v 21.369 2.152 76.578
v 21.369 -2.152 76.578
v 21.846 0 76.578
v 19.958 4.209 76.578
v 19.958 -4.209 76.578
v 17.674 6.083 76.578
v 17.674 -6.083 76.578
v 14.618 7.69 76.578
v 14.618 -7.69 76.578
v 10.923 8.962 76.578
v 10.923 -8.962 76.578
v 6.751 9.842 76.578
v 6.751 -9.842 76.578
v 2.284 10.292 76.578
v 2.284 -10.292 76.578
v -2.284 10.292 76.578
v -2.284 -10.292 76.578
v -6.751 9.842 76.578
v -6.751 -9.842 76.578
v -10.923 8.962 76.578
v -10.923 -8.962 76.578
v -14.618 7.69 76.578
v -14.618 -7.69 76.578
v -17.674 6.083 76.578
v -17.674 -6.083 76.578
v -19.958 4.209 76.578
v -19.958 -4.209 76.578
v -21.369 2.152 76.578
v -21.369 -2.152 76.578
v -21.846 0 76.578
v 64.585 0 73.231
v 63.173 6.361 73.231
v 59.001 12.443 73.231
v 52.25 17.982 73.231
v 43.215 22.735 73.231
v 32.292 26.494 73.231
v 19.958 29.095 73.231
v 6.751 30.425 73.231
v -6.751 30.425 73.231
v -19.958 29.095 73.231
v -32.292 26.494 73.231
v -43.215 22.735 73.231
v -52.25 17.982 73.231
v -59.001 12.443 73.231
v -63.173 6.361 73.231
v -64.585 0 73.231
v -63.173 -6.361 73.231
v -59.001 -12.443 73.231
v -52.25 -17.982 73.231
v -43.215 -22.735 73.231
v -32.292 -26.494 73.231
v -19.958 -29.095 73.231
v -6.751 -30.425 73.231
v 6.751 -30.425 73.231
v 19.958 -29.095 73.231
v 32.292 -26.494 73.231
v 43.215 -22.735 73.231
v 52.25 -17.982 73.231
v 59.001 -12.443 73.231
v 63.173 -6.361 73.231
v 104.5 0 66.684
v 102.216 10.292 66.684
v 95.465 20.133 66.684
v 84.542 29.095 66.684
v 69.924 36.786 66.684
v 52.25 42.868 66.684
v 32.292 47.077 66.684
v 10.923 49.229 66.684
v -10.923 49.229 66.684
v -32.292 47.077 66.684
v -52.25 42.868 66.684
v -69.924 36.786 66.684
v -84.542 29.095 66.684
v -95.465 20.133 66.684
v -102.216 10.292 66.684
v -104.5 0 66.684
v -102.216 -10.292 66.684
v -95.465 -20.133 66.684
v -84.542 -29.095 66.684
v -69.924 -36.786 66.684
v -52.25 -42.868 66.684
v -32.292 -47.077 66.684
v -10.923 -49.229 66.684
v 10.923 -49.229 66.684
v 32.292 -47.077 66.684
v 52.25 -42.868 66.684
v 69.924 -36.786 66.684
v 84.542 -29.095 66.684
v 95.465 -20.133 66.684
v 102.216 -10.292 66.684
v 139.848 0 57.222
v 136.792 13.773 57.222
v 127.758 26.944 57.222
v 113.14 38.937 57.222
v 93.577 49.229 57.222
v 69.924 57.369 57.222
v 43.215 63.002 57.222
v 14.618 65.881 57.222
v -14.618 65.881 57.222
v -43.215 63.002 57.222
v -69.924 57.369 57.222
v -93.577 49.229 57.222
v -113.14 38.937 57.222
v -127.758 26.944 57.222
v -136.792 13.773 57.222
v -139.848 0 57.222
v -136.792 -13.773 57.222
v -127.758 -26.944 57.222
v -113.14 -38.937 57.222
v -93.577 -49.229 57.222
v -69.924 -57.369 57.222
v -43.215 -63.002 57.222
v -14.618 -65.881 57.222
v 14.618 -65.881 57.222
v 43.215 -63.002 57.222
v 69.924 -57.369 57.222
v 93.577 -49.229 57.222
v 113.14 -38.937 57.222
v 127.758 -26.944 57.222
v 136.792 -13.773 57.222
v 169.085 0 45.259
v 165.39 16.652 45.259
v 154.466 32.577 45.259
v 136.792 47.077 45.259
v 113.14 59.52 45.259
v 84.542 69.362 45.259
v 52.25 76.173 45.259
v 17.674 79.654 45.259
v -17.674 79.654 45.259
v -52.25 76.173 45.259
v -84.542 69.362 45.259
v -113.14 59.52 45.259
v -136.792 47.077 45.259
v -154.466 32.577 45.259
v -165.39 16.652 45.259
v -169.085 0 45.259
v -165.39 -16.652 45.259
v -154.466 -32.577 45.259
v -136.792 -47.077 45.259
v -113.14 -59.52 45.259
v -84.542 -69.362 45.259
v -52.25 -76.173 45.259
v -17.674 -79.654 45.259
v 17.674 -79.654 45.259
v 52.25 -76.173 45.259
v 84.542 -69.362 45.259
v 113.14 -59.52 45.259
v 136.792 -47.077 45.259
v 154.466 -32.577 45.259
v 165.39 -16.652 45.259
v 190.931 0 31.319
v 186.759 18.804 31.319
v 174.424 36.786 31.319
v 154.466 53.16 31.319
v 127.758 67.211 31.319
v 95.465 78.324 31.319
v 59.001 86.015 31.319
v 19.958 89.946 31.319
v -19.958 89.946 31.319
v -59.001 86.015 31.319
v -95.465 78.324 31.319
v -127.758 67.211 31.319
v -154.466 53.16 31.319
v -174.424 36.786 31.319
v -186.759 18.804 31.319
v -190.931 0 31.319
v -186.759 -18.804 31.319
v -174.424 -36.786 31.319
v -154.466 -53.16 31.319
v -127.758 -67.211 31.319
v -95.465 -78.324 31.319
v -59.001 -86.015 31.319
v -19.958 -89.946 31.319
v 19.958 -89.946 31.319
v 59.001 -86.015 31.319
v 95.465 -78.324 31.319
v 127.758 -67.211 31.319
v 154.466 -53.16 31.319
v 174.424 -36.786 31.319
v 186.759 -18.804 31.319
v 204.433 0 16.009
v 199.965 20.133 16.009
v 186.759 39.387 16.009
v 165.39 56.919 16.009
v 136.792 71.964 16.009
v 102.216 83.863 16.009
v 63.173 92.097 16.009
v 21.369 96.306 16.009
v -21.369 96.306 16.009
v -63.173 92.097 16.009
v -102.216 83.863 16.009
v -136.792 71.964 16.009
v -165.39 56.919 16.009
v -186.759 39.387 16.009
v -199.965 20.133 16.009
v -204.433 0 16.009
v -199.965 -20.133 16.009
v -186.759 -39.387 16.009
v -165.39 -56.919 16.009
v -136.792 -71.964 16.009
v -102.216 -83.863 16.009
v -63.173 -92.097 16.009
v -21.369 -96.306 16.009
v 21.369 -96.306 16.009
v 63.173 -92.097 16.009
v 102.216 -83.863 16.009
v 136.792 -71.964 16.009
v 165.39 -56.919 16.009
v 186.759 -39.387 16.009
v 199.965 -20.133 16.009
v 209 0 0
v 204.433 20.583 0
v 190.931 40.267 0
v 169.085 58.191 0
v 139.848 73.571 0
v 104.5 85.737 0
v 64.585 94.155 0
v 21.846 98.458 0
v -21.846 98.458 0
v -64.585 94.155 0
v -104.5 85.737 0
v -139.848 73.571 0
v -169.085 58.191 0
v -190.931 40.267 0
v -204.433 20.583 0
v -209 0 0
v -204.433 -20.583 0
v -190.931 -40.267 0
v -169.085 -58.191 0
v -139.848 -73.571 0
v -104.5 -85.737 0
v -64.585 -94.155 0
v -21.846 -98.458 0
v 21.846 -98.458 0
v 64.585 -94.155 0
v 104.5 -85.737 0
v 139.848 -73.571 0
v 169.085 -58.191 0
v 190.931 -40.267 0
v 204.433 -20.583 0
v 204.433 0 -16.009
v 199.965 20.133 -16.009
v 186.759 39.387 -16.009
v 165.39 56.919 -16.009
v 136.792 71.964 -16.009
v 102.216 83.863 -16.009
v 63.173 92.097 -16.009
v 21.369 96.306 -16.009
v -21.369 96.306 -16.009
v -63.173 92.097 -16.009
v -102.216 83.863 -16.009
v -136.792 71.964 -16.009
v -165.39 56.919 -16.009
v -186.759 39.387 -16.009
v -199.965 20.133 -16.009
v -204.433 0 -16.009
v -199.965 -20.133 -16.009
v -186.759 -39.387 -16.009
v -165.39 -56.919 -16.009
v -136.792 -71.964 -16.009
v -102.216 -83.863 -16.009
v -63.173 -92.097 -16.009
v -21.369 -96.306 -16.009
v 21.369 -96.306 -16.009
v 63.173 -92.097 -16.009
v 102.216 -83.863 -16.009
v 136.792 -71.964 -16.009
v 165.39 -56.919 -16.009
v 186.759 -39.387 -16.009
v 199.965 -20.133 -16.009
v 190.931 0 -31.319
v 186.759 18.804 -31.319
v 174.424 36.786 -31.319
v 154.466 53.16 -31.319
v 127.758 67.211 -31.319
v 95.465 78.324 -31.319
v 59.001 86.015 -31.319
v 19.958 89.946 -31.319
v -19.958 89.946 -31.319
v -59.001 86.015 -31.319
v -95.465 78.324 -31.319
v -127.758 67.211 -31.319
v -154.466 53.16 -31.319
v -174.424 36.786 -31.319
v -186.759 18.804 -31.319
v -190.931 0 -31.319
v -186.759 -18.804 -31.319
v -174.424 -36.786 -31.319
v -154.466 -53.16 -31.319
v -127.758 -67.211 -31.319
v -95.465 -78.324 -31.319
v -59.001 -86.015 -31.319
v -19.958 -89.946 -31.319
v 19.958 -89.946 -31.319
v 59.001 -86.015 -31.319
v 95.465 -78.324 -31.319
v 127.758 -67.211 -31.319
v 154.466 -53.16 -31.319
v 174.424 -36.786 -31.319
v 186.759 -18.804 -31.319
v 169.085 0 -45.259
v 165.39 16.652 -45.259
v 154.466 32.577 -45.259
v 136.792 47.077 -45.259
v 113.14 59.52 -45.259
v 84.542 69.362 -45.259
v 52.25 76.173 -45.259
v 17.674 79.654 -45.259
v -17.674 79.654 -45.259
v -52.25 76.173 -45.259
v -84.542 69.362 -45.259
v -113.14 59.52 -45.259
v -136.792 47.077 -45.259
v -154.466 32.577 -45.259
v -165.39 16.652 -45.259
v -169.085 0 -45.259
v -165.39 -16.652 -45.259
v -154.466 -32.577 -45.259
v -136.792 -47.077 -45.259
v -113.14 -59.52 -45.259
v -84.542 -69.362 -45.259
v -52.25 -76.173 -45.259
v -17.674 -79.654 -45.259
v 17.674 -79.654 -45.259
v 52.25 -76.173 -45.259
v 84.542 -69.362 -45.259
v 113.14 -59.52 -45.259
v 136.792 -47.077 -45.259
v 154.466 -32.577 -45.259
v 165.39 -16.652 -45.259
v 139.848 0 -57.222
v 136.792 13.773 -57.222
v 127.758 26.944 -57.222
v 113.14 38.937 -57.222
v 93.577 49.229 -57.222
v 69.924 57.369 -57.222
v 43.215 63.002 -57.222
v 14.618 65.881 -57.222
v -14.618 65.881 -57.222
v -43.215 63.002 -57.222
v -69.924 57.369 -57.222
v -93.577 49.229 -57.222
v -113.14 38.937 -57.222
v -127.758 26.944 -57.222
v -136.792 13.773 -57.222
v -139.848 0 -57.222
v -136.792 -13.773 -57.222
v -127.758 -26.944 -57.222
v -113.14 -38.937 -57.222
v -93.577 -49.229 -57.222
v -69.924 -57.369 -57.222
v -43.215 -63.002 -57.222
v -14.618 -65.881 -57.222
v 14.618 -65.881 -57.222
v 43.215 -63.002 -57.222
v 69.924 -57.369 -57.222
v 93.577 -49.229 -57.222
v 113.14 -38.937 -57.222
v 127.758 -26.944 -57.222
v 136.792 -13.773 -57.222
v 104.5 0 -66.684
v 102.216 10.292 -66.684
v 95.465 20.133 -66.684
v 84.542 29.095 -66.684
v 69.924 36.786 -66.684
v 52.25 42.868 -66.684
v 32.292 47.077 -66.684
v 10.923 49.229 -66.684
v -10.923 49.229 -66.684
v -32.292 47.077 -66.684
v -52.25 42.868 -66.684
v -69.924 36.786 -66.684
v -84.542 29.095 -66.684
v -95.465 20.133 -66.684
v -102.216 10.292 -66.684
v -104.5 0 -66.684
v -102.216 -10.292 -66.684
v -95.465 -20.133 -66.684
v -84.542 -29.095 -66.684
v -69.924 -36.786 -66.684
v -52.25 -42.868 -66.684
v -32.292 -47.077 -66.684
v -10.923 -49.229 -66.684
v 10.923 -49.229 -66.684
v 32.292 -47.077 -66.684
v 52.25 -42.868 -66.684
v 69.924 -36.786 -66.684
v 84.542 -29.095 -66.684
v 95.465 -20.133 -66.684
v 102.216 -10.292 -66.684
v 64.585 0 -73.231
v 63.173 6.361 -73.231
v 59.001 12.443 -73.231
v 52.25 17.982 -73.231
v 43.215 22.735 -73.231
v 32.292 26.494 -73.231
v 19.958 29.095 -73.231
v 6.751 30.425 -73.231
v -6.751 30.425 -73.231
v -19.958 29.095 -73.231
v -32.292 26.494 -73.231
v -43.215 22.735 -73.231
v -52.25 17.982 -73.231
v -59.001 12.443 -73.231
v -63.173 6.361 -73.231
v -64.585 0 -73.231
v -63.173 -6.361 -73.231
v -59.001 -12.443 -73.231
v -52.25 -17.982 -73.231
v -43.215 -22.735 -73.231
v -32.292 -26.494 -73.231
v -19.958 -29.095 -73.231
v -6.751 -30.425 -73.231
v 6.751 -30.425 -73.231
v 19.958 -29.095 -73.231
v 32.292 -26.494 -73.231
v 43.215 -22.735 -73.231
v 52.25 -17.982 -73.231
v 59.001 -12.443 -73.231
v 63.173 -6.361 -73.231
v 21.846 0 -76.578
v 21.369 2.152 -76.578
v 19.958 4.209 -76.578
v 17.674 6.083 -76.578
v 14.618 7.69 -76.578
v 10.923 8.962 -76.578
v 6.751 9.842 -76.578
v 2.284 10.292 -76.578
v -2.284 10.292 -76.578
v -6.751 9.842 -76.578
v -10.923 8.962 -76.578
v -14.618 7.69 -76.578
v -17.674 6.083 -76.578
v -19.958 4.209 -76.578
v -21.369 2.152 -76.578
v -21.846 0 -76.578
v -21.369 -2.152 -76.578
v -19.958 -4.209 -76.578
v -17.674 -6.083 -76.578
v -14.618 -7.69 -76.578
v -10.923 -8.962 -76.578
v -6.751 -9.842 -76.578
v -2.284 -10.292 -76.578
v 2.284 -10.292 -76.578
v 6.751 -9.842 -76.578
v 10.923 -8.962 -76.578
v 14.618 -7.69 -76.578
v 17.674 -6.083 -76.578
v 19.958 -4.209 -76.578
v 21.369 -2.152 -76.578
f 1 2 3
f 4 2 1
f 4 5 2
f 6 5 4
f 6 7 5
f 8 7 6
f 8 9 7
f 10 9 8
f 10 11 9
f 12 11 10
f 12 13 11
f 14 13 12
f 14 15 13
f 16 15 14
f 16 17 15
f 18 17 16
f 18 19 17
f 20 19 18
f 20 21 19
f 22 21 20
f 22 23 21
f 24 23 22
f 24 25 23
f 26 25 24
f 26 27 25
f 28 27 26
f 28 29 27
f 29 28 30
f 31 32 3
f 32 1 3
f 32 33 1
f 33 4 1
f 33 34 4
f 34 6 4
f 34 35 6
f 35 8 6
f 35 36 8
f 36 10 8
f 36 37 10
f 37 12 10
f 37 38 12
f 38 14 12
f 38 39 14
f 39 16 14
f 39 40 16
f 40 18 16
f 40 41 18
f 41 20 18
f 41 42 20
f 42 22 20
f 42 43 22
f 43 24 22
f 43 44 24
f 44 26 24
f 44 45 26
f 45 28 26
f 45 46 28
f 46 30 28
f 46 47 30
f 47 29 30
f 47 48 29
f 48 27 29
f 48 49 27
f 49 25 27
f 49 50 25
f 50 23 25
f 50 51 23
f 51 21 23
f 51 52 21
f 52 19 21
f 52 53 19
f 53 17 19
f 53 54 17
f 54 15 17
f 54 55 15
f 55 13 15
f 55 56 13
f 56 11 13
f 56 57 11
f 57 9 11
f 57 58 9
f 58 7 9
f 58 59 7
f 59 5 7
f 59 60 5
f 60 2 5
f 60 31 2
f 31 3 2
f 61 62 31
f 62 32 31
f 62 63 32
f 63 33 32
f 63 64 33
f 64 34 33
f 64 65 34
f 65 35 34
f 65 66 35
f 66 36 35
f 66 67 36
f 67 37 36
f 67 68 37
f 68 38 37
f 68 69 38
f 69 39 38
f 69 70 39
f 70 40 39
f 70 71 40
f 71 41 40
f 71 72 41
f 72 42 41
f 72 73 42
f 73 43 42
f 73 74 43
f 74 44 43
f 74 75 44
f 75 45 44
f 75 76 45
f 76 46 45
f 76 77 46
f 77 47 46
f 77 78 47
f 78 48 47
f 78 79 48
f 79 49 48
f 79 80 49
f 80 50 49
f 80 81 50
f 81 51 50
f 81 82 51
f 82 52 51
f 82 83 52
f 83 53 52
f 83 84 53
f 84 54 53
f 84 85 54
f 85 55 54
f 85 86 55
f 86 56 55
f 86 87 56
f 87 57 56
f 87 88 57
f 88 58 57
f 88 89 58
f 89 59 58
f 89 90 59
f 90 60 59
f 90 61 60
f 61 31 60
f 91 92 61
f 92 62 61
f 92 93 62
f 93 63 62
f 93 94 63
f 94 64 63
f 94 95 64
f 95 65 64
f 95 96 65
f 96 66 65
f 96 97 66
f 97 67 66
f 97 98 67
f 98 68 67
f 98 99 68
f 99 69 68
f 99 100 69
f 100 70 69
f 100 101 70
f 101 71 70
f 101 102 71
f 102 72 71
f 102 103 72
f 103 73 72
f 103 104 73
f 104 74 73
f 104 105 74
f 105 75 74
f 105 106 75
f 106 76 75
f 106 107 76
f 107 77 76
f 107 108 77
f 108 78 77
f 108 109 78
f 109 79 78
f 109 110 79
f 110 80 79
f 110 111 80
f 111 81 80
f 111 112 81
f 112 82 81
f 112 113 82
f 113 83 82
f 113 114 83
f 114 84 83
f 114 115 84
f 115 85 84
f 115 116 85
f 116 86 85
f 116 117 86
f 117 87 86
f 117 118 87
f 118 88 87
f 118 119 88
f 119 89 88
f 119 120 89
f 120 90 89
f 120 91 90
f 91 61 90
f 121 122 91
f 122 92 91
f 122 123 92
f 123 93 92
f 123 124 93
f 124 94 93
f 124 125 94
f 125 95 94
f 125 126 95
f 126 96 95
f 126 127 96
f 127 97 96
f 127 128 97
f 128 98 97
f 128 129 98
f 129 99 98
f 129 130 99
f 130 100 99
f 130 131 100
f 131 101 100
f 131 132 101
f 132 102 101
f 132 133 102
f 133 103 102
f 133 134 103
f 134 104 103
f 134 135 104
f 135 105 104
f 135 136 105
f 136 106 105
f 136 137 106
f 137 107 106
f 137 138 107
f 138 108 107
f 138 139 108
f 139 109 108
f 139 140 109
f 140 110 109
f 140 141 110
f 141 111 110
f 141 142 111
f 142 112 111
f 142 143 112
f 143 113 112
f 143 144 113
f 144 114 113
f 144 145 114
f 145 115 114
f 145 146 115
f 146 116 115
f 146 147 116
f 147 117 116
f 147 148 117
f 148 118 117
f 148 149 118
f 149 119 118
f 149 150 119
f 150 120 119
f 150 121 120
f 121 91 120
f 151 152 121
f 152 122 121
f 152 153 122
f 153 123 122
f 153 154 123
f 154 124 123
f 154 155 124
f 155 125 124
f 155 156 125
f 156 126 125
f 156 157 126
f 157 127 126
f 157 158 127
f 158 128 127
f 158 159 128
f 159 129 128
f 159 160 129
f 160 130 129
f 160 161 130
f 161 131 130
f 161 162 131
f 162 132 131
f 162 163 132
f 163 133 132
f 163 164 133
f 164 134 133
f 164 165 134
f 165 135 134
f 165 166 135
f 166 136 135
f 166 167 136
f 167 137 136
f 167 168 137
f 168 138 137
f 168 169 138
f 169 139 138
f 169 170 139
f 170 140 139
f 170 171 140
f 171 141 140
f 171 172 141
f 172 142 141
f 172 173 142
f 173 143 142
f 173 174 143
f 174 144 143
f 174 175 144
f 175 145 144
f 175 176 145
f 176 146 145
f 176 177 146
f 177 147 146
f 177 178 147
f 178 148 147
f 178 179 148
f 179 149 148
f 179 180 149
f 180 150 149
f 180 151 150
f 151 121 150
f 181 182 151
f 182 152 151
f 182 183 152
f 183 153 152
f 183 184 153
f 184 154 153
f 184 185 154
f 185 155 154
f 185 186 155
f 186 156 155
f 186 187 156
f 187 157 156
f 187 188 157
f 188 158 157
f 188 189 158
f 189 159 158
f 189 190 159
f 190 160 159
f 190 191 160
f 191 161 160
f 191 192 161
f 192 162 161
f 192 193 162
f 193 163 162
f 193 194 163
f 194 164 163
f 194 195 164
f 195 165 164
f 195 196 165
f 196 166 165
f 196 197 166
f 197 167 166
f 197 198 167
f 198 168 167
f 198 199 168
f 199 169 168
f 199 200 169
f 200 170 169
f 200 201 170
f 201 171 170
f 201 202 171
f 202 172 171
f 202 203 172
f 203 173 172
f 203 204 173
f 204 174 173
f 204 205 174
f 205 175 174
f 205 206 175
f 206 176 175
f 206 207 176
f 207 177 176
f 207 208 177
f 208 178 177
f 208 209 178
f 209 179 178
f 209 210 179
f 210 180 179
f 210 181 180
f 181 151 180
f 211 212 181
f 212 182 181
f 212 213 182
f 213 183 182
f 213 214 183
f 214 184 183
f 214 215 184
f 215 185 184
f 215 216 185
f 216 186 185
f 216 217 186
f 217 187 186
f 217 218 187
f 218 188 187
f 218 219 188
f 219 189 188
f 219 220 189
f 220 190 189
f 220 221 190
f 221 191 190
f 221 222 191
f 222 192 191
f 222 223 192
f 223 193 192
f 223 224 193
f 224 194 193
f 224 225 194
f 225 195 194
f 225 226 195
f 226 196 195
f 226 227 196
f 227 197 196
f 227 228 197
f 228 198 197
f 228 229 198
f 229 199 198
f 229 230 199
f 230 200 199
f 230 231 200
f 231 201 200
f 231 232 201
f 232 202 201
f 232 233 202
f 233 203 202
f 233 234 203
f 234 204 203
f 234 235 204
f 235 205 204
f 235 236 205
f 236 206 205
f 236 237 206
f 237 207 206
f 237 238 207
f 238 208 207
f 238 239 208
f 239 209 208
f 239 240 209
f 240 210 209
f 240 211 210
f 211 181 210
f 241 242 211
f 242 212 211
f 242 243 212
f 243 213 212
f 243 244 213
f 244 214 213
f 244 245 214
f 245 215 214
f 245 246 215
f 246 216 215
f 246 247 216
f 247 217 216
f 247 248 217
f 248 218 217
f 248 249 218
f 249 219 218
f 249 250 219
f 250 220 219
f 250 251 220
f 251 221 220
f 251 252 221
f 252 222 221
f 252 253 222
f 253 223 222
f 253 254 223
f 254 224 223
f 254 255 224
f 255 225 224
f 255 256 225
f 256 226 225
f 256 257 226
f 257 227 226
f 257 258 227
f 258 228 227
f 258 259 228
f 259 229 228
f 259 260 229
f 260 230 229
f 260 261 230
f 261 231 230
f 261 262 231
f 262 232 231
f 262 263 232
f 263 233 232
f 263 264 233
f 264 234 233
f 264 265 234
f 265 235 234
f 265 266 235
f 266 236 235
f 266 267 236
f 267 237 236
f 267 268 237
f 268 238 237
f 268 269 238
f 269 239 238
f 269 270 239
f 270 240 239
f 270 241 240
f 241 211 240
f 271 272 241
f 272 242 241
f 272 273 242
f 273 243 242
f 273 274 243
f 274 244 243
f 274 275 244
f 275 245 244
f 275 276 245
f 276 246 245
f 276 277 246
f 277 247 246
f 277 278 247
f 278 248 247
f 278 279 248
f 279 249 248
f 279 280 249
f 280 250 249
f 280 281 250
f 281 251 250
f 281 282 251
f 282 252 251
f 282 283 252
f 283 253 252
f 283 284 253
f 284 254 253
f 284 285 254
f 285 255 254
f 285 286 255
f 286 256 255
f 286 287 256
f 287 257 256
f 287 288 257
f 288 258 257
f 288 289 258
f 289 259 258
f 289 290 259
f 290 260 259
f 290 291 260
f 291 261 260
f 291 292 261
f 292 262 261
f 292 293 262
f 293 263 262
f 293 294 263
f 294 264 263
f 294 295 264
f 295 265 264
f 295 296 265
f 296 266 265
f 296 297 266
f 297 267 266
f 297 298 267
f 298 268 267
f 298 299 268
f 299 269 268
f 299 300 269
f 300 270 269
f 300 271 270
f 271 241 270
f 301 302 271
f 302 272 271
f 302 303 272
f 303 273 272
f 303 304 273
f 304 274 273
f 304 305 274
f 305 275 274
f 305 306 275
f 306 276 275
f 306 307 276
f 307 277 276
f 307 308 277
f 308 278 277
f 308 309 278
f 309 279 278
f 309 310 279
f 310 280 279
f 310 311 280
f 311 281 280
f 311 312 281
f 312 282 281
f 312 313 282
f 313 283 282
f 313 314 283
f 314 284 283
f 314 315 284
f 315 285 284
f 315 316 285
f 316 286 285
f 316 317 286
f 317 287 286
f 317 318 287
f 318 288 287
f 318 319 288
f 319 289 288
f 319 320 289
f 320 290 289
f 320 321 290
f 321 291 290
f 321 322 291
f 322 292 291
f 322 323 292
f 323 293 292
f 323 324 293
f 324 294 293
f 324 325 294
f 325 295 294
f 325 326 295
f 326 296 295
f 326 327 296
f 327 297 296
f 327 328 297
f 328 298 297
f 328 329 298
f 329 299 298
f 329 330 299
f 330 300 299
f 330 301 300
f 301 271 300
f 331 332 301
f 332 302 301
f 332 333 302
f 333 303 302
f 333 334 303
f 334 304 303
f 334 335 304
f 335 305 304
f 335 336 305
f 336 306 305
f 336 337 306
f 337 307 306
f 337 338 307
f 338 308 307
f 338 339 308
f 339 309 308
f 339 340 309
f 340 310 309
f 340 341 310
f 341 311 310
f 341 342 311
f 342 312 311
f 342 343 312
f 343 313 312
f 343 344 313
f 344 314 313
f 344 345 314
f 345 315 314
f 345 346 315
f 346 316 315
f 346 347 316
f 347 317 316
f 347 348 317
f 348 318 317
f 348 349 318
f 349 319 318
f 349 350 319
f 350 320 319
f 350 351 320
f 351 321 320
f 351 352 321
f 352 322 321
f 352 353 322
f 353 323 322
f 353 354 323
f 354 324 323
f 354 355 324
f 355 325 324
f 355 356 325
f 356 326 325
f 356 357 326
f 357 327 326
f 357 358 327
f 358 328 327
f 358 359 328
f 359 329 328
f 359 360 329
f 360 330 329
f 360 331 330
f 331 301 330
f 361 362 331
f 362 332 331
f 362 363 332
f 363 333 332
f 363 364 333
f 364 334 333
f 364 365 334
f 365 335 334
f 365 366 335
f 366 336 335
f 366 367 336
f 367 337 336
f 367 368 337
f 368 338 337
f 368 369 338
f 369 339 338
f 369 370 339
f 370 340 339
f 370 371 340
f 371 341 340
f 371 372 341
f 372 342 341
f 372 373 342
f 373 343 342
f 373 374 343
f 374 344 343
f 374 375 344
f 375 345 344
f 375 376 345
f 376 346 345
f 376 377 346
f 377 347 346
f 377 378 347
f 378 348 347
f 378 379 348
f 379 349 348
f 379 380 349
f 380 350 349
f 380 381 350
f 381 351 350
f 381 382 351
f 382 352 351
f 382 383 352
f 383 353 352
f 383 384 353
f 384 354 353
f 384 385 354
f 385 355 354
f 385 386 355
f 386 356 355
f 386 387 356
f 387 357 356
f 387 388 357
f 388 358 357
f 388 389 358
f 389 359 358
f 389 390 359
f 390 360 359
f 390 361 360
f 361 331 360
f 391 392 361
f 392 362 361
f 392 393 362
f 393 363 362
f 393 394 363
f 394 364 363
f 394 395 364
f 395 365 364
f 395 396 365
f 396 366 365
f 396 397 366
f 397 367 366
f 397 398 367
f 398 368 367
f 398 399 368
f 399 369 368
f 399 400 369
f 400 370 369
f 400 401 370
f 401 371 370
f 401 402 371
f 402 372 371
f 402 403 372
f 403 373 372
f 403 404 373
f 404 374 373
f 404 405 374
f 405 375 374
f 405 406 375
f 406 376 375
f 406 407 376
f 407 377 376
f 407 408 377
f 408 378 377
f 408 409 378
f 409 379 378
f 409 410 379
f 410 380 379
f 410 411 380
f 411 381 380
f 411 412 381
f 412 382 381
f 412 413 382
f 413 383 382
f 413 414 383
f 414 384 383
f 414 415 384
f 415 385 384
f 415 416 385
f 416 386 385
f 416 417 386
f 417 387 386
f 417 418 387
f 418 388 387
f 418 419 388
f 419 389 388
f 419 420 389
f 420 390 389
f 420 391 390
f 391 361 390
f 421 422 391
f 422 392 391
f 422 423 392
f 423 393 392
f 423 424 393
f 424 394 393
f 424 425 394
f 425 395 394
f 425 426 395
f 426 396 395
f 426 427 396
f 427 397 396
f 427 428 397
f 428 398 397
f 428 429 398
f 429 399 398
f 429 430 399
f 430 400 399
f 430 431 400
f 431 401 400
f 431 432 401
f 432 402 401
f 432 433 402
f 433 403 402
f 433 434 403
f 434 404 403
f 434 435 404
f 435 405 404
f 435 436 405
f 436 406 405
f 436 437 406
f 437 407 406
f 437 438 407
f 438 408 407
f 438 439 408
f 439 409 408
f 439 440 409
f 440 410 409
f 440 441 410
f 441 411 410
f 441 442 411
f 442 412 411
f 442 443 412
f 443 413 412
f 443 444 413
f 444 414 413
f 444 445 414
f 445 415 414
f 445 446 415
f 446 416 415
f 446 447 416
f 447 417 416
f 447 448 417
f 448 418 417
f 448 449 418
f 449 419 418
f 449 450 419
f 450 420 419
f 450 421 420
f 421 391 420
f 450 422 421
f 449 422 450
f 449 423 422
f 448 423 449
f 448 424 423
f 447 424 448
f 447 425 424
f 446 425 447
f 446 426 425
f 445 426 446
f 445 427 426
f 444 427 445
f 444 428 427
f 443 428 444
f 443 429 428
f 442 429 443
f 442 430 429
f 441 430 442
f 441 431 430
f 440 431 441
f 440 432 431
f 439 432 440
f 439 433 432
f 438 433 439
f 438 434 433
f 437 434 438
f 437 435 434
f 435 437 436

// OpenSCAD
// Generated by SolidPython 1.0.1 on 2020-07-29 00:46:53


scale(v = [19, 9, 7]) {
	sphere(r = 11);
}
/***********************************************
*********      SolidPython code:      **********
************************************************
 
# import packages: SolidPython
from solid import *
from solid.utils import *
from itertools import chain, combinations, permutations


class Resize:

    def __init__(self, scad_file):
        self.scad_file = scad_file
        #self.scad_file = import_scad(scad_file)
        # cone/cylinder param:
        self.r1 = 0
        self.r2 = 0
        self.h = 0
        # rectangular prism param:
        self.w = 0
        self.l = 0
        # ellipse param:
        self.r = 0

    # import OpenScad code (file name corresponds to shape)


    # classify shape + parameters
    def assign(self, param1, param2, param3):
        if self.scad_file == 'cone.scad':
            self.r1 = param1
            self.r2 = param2
            self.h = param3
        elif self.scad_file == 'cylinder.scad':
            self.r1 = param1
            self.r2 = param2
            self.h = param3
        elif self.scad_file == 'rectangularPrism.scad':
            self.h = param1
            self.l = param2
            self.w = param3
        else:
            self.r = param1
            self.h = param2

    # resize parameters
    def iterate(self):
        x = range(3, 20, 2)
        i = 1
        if self.scad_file == 'cone.scad':
            tempList = list(permutations(x, 2))
            for temp in tempList:
                param1 = temp[0]
                param2 = temp[1]
                filepath = 'produced_scad_files/' + 'cone' + str(param1) + '_' + str(param2) + '_' + '.scad'
                scad_render_to_file(cylinder(h=param1, r1=param2, r2=0), filepath)

        elif self.scad_file == 'cylinder.scad':
            tempList = list(permutations(x, 3))
            for temp in tempList:
                param1 = temp[0]
                param2 = temp[1]
                filepath = 'produced_scad_files/' + 'cylinder' + str(param1) + '_' + str(param2) + '_' + '.scad'
                scad_render_to_file(cylinder(h=param1, r1=param2, r2=param2), filepath)

        elif self.scad_file == 'rectangularPrism.scad':
            tempList = list(permutations(x, 3))
            for temp in tempList:
                param1 = temp[0]
                param2 = temp[1]
                param3 = temp[2]
                filepath = 'produced_scad_files/' + 'rectangularPrism' + str(param1) + '_' + str(param2) + '_' + str(
                    param3) + '.scad'
                scad_render_to_file(cube(size=(param1, param2, param3)), filepath)

        elif self.scad_file == 'ellipse.scad':
            tempList = list(permutations(x, 4))
            for temp in tempList:
                param1 = temp[0]
                param2 = temp[1]
                param3 = temp[2]
                param4 = temp[3]
                filepath = 'produced_scad_files/' + 'ellipse' + str(param1) + '_' + str(param2) + '_' + str(param3) + '_' + str(param4) + '.scad'
                scad_render_to_file(scale([param1, param2, param3])(sphere(r=param4)), filepath)

    def render_to_scadfile(self):
        scad_render_to_file(scad, 'example.scad') 
 
************************************************/
